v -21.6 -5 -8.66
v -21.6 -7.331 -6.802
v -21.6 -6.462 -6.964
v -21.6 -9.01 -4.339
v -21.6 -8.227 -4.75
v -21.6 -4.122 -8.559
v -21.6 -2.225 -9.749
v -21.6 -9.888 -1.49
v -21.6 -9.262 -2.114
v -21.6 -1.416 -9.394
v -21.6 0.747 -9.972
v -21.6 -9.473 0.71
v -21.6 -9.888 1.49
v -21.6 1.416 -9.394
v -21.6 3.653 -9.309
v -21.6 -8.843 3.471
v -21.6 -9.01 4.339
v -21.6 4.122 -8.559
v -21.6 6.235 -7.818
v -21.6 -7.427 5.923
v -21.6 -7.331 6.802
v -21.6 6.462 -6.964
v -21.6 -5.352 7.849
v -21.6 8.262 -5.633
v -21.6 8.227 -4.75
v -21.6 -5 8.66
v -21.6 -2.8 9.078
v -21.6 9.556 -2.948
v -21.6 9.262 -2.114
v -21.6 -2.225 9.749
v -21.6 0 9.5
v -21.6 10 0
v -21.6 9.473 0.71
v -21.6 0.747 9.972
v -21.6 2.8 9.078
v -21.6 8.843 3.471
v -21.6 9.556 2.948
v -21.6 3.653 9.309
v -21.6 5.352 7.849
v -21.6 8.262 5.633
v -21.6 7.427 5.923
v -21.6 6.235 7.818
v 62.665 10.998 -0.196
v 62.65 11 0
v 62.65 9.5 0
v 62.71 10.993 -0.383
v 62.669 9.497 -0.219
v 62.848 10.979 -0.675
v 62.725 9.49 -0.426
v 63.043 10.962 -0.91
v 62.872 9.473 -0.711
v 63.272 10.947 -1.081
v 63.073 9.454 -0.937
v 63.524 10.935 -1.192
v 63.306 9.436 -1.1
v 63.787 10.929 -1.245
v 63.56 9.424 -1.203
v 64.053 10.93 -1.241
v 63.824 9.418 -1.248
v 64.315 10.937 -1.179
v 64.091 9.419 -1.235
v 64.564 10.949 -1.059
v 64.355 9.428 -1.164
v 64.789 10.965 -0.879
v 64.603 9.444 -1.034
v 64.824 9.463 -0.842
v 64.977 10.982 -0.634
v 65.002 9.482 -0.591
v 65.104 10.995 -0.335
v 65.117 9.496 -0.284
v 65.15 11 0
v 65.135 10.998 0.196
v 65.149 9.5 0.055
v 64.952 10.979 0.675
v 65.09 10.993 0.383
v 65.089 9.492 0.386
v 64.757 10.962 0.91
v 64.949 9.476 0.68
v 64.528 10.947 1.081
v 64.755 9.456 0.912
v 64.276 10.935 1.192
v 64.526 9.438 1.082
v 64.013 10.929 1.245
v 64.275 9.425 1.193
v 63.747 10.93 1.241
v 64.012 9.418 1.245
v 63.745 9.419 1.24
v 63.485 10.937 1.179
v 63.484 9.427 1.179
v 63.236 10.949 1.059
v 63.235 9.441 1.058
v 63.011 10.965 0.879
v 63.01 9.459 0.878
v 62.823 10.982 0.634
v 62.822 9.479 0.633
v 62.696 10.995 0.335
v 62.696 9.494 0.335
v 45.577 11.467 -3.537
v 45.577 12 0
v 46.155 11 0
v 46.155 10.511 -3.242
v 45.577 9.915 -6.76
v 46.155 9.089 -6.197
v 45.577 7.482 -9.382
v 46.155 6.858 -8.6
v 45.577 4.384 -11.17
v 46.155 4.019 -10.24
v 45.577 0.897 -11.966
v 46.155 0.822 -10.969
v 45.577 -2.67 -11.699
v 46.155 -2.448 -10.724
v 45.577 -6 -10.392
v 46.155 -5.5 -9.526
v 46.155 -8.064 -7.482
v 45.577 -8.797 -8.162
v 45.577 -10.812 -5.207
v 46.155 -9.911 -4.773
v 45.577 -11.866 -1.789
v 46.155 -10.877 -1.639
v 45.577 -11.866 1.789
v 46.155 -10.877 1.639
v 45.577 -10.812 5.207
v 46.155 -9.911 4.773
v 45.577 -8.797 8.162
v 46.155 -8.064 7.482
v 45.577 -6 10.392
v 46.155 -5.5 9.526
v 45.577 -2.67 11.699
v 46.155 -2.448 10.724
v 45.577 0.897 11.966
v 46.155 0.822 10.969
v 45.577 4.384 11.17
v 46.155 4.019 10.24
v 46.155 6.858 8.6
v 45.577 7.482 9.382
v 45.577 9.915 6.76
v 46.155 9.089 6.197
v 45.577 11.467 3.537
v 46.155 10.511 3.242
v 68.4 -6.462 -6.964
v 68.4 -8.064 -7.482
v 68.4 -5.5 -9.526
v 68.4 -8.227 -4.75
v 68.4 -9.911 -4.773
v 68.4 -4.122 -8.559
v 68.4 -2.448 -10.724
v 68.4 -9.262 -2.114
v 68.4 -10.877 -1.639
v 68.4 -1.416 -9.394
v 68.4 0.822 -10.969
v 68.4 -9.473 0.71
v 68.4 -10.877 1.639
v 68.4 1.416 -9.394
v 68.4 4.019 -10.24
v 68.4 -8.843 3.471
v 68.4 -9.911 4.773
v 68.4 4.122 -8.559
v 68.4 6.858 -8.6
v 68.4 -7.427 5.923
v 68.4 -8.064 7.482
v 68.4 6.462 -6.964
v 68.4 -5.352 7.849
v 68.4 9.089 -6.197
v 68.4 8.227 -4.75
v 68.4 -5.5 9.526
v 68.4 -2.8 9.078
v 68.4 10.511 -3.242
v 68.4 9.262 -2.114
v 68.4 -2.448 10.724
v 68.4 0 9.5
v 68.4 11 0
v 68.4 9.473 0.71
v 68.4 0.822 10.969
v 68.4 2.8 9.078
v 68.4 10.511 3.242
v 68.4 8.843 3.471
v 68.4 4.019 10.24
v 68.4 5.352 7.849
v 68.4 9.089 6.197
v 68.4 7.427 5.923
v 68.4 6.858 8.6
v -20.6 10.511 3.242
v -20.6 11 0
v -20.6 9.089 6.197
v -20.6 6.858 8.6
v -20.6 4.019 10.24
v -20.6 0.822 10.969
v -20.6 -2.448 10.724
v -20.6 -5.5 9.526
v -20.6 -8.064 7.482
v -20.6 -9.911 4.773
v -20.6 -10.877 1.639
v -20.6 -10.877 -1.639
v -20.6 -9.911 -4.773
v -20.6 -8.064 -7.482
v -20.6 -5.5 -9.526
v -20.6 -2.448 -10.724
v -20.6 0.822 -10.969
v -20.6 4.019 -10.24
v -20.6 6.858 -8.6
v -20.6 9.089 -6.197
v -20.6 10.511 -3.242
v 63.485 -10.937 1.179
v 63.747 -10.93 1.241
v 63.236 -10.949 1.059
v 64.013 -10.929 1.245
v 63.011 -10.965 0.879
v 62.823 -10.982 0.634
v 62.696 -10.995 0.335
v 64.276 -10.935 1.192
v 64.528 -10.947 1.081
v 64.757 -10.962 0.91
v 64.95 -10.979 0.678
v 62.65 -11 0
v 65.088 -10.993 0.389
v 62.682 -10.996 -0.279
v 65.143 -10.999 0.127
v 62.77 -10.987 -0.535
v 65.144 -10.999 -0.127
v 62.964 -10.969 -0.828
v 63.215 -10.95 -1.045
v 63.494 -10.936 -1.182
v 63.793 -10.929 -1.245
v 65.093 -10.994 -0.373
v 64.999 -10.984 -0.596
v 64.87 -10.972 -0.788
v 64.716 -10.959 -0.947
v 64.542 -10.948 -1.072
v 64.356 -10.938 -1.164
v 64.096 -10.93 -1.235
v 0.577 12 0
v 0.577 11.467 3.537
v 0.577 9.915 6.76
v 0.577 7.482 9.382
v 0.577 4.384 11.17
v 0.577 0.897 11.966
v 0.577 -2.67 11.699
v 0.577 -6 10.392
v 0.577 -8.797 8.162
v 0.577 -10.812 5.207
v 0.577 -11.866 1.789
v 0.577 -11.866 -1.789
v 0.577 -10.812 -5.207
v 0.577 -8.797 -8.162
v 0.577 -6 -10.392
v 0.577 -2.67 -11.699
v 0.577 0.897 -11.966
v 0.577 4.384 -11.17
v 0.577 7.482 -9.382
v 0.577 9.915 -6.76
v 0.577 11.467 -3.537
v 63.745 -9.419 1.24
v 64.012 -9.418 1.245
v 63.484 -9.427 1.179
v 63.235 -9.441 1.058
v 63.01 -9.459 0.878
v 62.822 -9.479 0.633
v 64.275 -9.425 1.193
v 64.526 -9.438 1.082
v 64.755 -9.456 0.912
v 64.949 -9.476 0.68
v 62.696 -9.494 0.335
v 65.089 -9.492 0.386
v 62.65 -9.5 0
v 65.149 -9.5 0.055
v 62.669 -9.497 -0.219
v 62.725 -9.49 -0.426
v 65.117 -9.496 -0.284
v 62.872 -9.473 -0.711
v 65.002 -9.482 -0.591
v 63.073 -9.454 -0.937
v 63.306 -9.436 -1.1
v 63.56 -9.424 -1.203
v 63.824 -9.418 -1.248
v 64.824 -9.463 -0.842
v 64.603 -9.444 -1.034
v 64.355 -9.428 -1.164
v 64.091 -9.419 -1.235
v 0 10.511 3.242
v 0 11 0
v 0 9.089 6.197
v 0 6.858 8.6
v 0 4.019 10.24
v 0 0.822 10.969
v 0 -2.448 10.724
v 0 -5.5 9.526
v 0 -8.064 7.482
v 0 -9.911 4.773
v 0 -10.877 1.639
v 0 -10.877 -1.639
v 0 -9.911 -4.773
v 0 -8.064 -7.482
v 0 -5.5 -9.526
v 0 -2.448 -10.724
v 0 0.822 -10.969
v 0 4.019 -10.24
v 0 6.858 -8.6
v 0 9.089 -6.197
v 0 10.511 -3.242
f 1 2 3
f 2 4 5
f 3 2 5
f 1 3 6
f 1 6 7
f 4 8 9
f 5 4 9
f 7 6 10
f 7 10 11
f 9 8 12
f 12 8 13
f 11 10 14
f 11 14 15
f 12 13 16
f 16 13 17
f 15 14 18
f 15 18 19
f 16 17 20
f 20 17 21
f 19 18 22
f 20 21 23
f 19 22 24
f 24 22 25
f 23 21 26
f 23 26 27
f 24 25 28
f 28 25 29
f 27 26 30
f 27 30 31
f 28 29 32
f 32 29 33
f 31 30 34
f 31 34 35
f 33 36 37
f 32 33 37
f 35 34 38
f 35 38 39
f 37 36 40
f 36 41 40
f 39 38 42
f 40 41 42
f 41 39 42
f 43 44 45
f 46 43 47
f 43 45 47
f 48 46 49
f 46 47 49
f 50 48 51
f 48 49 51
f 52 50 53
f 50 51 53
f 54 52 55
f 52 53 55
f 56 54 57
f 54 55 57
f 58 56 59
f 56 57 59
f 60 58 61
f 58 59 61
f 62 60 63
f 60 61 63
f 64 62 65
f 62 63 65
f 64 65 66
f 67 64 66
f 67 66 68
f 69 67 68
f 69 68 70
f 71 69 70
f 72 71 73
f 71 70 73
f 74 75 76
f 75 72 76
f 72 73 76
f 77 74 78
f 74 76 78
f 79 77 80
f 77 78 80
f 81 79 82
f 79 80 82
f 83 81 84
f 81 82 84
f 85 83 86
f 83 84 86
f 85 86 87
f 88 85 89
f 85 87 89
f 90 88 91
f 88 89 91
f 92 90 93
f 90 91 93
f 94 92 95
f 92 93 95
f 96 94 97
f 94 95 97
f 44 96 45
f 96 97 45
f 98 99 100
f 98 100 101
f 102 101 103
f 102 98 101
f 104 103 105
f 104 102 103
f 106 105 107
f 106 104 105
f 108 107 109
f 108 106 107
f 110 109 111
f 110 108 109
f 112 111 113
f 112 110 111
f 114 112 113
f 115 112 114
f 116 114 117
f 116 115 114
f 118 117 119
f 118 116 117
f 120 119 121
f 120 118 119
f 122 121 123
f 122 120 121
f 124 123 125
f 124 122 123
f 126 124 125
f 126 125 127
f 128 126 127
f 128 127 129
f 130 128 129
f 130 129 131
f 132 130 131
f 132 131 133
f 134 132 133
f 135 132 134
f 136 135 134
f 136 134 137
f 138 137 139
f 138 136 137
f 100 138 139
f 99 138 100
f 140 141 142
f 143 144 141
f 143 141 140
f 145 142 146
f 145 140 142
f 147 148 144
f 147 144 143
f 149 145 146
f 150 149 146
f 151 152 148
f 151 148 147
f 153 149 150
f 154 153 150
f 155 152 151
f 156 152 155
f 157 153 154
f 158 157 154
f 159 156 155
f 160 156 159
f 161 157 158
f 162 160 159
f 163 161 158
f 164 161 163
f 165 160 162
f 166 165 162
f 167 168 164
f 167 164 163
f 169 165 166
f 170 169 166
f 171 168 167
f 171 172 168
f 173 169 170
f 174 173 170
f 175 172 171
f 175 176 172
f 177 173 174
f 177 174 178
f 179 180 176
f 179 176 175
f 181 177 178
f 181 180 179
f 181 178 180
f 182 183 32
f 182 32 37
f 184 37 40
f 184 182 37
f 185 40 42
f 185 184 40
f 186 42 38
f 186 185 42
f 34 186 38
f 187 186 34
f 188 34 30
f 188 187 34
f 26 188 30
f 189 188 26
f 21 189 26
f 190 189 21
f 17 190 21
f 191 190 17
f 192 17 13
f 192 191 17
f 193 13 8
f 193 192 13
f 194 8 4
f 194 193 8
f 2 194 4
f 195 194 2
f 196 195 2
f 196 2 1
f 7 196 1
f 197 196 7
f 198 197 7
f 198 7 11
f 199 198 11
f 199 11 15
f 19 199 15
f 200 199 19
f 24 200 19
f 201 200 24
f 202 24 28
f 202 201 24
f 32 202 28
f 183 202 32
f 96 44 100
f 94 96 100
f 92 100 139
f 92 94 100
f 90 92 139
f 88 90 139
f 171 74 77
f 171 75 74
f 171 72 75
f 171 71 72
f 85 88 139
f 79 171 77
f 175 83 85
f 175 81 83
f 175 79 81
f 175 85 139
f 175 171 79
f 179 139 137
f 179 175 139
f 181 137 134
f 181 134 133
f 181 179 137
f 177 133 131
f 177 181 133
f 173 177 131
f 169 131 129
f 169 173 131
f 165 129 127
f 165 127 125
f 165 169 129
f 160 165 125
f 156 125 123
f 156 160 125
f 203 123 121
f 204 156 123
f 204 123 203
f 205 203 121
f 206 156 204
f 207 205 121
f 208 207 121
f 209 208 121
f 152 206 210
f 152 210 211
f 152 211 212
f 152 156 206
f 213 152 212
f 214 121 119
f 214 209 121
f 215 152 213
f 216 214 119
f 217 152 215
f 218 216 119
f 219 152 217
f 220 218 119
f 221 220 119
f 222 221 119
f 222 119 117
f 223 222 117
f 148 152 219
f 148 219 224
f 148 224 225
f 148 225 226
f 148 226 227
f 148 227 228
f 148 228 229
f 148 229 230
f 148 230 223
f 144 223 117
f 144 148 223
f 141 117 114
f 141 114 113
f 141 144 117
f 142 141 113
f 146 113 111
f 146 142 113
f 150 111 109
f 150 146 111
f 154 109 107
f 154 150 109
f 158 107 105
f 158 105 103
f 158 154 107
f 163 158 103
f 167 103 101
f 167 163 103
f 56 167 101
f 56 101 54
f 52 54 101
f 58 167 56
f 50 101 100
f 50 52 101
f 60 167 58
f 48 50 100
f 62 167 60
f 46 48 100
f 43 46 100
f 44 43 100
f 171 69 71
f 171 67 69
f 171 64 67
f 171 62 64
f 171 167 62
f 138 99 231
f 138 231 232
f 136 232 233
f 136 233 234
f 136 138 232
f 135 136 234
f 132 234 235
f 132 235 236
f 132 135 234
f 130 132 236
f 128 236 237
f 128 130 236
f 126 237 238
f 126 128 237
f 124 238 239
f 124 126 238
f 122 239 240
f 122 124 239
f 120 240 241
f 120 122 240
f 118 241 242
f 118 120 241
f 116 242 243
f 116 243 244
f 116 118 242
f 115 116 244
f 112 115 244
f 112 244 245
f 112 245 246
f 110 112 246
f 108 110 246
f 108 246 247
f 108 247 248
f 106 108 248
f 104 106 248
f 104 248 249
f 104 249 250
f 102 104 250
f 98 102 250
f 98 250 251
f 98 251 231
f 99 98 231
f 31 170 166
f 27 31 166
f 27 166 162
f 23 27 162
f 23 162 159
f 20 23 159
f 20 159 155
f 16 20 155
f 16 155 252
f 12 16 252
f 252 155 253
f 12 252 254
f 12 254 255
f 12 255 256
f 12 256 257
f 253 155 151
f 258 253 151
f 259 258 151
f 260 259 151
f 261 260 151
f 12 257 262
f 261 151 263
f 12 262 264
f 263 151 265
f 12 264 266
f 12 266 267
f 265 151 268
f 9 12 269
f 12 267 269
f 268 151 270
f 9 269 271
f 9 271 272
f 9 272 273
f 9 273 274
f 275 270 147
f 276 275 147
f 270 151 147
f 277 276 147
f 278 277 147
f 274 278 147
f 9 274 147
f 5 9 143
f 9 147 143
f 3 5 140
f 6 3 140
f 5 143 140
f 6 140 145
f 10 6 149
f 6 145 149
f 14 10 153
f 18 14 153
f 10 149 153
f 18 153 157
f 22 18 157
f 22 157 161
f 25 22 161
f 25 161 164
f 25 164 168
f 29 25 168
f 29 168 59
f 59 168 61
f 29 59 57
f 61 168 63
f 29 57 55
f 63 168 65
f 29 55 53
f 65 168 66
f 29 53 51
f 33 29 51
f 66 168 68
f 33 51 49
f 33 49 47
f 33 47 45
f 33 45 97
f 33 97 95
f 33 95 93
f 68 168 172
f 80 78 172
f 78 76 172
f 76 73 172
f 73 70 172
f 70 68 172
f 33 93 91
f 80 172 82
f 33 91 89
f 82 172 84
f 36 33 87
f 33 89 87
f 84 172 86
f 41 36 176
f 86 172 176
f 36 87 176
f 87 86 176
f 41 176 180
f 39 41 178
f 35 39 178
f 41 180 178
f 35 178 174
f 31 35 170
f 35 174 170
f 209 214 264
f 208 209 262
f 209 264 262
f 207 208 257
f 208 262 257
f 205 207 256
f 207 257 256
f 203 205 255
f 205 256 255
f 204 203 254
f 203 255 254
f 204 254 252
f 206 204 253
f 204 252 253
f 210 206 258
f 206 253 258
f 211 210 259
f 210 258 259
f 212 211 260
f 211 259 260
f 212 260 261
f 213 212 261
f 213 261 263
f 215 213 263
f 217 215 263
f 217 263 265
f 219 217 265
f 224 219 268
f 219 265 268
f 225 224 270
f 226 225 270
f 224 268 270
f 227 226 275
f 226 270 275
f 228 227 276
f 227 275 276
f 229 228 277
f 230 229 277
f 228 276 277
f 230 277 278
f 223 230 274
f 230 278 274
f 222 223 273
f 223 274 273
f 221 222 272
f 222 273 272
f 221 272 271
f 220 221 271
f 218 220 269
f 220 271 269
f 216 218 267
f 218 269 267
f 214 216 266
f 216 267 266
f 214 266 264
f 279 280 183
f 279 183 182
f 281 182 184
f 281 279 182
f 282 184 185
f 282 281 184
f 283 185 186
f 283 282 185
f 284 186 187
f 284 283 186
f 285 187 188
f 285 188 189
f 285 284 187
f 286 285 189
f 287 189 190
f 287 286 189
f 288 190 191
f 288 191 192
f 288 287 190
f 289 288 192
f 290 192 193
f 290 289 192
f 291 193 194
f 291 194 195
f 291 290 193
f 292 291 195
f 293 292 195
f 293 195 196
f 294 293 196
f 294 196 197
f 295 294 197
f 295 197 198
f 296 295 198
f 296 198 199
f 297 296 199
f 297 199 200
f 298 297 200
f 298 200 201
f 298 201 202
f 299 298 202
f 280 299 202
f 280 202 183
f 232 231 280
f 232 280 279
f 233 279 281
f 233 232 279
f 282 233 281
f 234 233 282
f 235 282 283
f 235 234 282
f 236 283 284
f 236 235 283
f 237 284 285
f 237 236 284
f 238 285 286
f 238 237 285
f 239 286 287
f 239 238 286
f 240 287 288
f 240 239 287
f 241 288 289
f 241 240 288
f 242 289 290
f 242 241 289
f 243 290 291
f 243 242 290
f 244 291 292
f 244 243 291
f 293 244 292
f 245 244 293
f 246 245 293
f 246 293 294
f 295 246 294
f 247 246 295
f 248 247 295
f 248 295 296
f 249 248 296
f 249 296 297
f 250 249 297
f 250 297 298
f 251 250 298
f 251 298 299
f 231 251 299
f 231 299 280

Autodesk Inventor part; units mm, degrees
ref_plane "YZ Plane" through (0, 0, 0) normal (1, 0, 0) x (0, 1, 0)
ref_plane "XZ Plane" through (0, 0, 0) normal (0, 1, 0) x (-1, 0, 0)
ref_plane "XY Plane" through (0, 0, 0) normal (0, 0, 1) x (1, 0, 0)
sketch "Profile" plane through (0, 0, 0) normal (0, 0, 1) x (1, 0, 0)
  line L0 (-21.6, 0) -> (-21.6, 11)
  line L1 (-21.6, 11) -> (0, 11)
  line L2 (0, 11) -> (0.5774, 12)
  line L3 (0.5774, 12) -> (45.5774, 12)
  line L4 (45.5774, 12) -> (46.1547, 11)
  line L5 (46.1547, 11) -> (68.4, 11)
  line L6 (68.4, 11) -> (68.4, 0)
  line L7 (-21.6, 0) -> (0, 0)
  line L8 (0, 0) -> (0, 9)
  line L9 (0, 9) -> (60.4, 9)
  line L10 (60.4, 9) -> (60.4, 0)
  line L11 (60.4, 0) -> (68.4, 0)
  line L12 (-39.6, 0) -> (86.4, 0) construction
  line L13 (0, 11) -> (0, 9) construction
  dimension "BodyLength" = 90
  dimension "d1" = 11
  dimension "d3" = 120
  dimension "d4" = 120
  dimension "d5" = 45
  dimension "d6" = 21.6
  dimension "d16" = 8
  dimension "d29" = 1
  dimension "d30" = 9
revolve "ProfileRevolveFeature" add sketch "Profile" angle 360 about axis through (-10, 0, 0) along (1, 0, 0)
sketch "InsideHole" plane through (-21.6, 0, 0) normal (-1, 0, 0) x (0, 0, 1)
  circle A0 centre (0, 0) radius 9 construction
hole "InsideHoleFeature" at (-21.6, 0, 0) direction (1, 0, 0) diameter 19 end through all
chamfer "EndChamferFeature" distance 1 angle 45 1 edges at (-21.6, -11, 0)
sketch "CapMountHole" plane through (0, 0, 0) normal (0, 1, 0) x (-1, 0, 0)
  line L0 (-68.4, 11) -> (-68.4, -11) construction
  line L1 (10.64, 0) -> (-63.84, 0) construction
  circle A0 centre (-63.9, 0) radius 1.25
  point P0 (0, 0)
  dimension "d31" = 4.5
  dimension "d39" = 2.5
extrude "CapMountHoleFeature" cut sketch "CapMountHole" along normal through all both and the other way through all
equation "\"d5\" = 0.5 * BodyLength"
equation "\"d6\" = 0.24 * BodyLength"
properties part number "BackPair1PistonBody"
